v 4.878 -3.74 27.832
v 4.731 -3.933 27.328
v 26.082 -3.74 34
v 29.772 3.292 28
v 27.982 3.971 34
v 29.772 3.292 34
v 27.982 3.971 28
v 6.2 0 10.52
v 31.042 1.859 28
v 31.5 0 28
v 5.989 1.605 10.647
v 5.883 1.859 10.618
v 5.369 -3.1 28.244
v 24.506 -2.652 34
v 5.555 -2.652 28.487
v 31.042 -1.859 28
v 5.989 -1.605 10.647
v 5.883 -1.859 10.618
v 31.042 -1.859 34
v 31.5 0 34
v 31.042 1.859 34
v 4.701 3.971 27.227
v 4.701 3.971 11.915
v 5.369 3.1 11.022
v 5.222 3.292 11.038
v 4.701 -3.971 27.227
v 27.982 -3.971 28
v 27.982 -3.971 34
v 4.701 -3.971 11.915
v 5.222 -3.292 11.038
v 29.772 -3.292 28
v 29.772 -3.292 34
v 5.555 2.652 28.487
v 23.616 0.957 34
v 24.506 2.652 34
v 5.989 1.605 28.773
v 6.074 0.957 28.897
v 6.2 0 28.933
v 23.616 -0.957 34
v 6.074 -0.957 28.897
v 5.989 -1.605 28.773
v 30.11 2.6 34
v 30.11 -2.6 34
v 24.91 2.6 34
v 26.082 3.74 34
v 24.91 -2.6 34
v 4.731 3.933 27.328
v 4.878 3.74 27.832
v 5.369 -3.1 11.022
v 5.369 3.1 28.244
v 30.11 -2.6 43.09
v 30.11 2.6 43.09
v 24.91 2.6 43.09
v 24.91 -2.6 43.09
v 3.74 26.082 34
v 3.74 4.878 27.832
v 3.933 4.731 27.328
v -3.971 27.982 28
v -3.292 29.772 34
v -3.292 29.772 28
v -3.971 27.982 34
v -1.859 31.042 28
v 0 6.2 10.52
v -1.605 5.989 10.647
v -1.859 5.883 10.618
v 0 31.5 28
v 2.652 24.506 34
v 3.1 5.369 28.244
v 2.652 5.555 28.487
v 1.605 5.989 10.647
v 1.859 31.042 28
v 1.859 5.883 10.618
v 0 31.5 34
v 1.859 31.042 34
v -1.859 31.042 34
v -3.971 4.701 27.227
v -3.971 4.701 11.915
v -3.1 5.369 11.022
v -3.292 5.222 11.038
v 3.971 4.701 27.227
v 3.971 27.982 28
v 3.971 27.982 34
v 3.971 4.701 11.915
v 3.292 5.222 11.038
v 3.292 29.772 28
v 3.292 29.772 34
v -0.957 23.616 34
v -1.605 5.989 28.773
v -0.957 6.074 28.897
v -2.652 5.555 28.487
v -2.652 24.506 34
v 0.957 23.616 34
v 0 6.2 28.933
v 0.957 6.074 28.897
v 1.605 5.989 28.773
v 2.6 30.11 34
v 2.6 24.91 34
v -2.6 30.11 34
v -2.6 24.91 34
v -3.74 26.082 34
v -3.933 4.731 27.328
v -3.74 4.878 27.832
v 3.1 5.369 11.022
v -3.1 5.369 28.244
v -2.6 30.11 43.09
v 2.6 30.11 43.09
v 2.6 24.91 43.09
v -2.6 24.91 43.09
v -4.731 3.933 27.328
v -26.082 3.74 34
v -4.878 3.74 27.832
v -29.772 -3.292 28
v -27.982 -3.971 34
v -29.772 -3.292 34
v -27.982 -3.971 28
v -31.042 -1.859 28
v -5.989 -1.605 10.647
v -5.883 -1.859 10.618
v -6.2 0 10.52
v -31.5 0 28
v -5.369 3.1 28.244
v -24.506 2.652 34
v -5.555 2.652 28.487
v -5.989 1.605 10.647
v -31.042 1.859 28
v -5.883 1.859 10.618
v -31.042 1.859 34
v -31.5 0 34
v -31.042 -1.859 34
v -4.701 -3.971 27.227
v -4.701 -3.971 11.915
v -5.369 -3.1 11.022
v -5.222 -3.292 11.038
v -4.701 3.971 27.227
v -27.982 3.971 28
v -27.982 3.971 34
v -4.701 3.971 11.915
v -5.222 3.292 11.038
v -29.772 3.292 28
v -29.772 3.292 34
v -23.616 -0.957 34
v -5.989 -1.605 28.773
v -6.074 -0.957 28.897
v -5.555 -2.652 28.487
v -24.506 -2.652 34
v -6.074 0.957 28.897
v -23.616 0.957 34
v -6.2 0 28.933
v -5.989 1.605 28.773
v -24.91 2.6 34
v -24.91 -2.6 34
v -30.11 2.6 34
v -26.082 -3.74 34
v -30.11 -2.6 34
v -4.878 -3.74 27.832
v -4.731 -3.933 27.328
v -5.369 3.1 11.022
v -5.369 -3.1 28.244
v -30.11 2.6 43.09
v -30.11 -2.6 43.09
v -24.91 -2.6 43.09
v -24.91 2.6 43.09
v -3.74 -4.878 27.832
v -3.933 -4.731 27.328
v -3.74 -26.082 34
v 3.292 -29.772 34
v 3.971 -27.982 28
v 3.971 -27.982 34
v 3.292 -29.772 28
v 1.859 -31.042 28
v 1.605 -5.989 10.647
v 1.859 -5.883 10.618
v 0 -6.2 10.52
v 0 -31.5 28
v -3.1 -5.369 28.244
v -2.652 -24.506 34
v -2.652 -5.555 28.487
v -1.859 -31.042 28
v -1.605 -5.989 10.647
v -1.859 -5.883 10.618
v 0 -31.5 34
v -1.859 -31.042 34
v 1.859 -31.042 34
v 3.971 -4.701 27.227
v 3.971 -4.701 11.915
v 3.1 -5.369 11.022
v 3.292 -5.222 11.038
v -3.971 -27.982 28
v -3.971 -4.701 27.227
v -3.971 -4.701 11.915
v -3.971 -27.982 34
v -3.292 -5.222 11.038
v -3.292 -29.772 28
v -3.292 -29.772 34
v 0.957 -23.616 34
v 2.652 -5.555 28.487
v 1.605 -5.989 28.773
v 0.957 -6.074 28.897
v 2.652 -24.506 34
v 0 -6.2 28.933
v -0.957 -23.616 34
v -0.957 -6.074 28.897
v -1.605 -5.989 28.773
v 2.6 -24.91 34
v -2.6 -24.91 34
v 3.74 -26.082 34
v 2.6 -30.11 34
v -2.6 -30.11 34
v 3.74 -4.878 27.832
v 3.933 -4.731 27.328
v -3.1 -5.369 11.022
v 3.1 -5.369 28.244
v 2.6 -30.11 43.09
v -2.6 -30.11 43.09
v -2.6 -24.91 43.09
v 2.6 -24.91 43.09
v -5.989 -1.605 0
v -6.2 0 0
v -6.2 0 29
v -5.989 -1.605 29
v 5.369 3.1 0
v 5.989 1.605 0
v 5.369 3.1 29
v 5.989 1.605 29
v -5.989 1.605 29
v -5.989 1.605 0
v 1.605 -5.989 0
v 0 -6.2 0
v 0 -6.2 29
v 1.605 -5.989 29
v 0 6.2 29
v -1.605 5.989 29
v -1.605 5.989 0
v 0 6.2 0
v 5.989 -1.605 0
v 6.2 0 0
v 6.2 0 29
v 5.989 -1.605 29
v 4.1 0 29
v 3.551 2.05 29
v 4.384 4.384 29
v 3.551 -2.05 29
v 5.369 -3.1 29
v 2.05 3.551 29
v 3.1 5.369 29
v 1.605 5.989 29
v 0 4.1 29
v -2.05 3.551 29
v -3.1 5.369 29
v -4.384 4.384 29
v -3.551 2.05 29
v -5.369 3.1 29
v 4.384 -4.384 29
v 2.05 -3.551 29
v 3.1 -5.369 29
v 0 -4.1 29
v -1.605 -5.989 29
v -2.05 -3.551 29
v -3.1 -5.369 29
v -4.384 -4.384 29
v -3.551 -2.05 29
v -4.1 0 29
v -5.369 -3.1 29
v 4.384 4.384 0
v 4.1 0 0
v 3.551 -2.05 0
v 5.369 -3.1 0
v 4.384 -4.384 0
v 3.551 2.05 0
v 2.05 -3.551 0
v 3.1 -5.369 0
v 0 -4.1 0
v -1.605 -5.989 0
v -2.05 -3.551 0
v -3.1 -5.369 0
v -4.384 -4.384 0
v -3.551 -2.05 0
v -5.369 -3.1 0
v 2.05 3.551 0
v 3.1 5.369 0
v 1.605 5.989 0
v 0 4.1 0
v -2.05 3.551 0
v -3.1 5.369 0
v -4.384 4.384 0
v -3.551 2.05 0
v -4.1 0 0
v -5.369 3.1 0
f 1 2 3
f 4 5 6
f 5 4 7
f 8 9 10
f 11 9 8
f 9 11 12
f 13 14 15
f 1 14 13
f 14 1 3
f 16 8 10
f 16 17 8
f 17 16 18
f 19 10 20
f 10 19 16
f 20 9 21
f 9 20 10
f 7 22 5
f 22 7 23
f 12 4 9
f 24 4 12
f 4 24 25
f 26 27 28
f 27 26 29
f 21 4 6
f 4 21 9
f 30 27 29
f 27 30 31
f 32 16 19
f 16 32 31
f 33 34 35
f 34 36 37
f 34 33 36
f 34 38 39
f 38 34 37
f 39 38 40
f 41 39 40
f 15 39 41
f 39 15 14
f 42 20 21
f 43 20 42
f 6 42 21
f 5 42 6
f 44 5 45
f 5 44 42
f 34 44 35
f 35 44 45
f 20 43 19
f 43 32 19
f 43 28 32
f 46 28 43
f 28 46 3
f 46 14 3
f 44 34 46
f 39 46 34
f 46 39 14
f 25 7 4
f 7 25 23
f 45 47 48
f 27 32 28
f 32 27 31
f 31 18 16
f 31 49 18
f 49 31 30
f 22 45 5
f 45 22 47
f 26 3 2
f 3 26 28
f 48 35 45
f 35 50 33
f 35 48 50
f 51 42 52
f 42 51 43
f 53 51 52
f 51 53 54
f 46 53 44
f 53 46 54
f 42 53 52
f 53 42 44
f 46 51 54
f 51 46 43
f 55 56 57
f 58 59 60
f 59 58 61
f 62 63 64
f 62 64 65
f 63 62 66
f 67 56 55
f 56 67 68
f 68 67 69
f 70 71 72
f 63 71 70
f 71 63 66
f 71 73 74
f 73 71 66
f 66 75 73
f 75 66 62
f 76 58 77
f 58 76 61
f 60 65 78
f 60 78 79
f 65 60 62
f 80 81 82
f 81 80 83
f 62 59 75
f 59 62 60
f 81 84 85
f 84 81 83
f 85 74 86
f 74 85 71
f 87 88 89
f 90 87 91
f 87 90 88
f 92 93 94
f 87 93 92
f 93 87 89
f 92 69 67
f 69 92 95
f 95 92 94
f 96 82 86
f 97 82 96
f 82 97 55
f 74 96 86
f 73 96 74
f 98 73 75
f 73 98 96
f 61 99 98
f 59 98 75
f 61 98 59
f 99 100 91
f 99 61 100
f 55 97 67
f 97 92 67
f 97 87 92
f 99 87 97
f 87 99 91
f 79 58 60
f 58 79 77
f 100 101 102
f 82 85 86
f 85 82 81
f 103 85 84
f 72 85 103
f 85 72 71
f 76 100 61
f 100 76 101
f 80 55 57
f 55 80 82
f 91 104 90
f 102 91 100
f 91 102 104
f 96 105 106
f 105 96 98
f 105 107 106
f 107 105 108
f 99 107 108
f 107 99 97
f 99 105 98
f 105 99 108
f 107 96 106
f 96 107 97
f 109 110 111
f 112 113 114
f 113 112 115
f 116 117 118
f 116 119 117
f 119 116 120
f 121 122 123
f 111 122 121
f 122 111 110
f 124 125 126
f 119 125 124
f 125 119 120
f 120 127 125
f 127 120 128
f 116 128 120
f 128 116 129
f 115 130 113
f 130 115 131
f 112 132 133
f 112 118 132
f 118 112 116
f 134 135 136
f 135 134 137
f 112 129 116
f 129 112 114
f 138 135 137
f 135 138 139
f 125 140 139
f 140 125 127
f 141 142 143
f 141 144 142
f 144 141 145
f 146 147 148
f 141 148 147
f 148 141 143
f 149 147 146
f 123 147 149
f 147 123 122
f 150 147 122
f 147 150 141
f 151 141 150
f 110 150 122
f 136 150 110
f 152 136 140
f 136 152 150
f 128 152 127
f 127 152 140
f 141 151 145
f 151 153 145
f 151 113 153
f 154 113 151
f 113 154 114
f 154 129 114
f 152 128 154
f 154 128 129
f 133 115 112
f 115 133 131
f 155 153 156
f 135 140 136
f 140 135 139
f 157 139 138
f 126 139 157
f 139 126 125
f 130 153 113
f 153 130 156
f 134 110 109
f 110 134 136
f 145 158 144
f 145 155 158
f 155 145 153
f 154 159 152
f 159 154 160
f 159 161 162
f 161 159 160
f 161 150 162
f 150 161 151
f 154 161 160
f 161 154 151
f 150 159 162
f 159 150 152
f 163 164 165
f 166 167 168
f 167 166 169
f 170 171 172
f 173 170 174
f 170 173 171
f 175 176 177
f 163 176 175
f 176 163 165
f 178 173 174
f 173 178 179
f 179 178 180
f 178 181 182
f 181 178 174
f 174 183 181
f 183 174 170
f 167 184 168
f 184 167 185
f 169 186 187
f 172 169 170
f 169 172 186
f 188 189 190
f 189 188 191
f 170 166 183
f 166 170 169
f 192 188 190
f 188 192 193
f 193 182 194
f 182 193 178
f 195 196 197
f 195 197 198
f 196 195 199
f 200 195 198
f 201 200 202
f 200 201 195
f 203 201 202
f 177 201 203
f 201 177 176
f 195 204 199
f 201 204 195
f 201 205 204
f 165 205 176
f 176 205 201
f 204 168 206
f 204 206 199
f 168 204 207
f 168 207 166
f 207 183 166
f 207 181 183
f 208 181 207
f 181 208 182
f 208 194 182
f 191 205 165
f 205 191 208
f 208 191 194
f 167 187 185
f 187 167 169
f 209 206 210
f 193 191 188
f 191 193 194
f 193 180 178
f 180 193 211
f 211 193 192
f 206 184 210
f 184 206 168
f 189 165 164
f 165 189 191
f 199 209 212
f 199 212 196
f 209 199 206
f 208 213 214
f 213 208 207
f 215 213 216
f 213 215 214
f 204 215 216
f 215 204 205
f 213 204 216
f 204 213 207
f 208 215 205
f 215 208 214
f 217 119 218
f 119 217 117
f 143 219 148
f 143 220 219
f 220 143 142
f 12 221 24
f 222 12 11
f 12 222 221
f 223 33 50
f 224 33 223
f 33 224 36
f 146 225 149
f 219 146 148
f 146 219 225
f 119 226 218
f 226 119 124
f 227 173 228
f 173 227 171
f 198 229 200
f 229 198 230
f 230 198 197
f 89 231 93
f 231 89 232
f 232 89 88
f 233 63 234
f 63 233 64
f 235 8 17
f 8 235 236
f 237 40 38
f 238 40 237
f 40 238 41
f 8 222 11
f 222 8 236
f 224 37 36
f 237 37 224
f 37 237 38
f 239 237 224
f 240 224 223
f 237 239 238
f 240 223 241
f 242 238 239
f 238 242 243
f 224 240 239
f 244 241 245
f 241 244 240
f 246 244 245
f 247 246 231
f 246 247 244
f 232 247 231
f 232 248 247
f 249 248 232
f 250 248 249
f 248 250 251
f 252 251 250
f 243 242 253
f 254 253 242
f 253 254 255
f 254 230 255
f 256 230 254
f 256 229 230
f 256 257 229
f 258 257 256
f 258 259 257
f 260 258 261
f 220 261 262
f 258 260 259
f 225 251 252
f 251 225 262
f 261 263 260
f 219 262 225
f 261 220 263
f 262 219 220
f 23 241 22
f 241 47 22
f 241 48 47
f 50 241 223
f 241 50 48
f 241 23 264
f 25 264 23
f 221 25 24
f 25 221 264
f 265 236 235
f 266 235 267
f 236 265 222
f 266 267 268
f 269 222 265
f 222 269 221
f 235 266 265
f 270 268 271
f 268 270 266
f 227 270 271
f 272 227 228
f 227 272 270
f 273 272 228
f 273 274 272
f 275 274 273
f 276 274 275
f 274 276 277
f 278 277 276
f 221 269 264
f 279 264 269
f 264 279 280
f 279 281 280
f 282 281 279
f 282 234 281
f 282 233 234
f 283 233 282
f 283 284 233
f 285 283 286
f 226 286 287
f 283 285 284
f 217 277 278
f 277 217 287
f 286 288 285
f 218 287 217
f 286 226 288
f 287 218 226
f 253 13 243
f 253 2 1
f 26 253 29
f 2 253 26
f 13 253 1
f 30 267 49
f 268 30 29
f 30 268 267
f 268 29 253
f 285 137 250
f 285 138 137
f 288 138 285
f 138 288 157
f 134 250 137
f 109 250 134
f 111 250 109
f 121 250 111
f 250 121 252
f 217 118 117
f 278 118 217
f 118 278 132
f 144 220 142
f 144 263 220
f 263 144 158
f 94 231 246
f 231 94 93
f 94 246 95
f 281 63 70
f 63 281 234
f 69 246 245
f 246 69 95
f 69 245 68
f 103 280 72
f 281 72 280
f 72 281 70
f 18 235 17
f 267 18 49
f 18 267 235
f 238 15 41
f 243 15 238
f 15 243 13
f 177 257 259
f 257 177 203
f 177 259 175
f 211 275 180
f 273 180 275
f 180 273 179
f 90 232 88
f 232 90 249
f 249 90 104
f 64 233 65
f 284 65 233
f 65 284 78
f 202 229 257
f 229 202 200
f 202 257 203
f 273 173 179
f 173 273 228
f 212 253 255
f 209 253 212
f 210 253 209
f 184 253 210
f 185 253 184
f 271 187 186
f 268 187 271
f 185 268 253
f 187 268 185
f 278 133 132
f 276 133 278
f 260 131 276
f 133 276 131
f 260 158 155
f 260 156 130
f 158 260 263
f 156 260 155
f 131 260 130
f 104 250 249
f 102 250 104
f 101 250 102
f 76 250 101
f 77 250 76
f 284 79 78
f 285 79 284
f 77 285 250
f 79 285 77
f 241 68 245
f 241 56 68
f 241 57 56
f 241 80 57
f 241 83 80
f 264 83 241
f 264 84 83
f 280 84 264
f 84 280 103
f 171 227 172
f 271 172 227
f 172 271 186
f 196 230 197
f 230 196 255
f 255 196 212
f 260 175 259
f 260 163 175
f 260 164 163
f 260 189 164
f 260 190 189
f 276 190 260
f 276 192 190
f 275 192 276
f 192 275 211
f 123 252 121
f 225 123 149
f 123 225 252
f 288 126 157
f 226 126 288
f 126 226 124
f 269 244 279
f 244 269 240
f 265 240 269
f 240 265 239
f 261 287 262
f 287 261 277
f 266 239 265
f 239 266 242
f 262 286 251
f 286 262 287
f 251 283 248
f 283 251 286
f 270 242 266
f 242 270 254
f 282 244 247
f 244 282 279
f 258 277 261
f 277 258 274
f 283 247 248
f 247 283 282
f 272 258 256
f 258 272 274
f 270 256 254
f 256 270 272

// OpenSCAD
//
// Adapter for a garden solar globe light
//

module arm () {
    // The arm
    hull () {
        translate([0, 0, 9.0])
            cylinder(17.0, r=8.0/2);
        translate([27.5, 0, 28.0])
            cylinder(6.0, r=8.0/2);
    }
    // Square peg
    translate([27.5 - (5.2/2) + 0.01, (5.2/2)*-1, 28.0+6.0-0.01])
        cube([5.2, 5.2, 9.1]);
}

module arms () {
    for (i = [0 : 3]) {
        rotate(i*90.0, [0,0,1])
            arm();
    }
}

module adapter ()
{
    difference () {
        union () {
            cylinder(29.0, r=12.4/2, $fn=24);
            arms();
        }

        // Tall enough to pierce the arm.
        translate([0, 0, -0.01])
            cylinder(29.0+0.02, r=8.2/2, $fn=12);
    }
}

adapter();
